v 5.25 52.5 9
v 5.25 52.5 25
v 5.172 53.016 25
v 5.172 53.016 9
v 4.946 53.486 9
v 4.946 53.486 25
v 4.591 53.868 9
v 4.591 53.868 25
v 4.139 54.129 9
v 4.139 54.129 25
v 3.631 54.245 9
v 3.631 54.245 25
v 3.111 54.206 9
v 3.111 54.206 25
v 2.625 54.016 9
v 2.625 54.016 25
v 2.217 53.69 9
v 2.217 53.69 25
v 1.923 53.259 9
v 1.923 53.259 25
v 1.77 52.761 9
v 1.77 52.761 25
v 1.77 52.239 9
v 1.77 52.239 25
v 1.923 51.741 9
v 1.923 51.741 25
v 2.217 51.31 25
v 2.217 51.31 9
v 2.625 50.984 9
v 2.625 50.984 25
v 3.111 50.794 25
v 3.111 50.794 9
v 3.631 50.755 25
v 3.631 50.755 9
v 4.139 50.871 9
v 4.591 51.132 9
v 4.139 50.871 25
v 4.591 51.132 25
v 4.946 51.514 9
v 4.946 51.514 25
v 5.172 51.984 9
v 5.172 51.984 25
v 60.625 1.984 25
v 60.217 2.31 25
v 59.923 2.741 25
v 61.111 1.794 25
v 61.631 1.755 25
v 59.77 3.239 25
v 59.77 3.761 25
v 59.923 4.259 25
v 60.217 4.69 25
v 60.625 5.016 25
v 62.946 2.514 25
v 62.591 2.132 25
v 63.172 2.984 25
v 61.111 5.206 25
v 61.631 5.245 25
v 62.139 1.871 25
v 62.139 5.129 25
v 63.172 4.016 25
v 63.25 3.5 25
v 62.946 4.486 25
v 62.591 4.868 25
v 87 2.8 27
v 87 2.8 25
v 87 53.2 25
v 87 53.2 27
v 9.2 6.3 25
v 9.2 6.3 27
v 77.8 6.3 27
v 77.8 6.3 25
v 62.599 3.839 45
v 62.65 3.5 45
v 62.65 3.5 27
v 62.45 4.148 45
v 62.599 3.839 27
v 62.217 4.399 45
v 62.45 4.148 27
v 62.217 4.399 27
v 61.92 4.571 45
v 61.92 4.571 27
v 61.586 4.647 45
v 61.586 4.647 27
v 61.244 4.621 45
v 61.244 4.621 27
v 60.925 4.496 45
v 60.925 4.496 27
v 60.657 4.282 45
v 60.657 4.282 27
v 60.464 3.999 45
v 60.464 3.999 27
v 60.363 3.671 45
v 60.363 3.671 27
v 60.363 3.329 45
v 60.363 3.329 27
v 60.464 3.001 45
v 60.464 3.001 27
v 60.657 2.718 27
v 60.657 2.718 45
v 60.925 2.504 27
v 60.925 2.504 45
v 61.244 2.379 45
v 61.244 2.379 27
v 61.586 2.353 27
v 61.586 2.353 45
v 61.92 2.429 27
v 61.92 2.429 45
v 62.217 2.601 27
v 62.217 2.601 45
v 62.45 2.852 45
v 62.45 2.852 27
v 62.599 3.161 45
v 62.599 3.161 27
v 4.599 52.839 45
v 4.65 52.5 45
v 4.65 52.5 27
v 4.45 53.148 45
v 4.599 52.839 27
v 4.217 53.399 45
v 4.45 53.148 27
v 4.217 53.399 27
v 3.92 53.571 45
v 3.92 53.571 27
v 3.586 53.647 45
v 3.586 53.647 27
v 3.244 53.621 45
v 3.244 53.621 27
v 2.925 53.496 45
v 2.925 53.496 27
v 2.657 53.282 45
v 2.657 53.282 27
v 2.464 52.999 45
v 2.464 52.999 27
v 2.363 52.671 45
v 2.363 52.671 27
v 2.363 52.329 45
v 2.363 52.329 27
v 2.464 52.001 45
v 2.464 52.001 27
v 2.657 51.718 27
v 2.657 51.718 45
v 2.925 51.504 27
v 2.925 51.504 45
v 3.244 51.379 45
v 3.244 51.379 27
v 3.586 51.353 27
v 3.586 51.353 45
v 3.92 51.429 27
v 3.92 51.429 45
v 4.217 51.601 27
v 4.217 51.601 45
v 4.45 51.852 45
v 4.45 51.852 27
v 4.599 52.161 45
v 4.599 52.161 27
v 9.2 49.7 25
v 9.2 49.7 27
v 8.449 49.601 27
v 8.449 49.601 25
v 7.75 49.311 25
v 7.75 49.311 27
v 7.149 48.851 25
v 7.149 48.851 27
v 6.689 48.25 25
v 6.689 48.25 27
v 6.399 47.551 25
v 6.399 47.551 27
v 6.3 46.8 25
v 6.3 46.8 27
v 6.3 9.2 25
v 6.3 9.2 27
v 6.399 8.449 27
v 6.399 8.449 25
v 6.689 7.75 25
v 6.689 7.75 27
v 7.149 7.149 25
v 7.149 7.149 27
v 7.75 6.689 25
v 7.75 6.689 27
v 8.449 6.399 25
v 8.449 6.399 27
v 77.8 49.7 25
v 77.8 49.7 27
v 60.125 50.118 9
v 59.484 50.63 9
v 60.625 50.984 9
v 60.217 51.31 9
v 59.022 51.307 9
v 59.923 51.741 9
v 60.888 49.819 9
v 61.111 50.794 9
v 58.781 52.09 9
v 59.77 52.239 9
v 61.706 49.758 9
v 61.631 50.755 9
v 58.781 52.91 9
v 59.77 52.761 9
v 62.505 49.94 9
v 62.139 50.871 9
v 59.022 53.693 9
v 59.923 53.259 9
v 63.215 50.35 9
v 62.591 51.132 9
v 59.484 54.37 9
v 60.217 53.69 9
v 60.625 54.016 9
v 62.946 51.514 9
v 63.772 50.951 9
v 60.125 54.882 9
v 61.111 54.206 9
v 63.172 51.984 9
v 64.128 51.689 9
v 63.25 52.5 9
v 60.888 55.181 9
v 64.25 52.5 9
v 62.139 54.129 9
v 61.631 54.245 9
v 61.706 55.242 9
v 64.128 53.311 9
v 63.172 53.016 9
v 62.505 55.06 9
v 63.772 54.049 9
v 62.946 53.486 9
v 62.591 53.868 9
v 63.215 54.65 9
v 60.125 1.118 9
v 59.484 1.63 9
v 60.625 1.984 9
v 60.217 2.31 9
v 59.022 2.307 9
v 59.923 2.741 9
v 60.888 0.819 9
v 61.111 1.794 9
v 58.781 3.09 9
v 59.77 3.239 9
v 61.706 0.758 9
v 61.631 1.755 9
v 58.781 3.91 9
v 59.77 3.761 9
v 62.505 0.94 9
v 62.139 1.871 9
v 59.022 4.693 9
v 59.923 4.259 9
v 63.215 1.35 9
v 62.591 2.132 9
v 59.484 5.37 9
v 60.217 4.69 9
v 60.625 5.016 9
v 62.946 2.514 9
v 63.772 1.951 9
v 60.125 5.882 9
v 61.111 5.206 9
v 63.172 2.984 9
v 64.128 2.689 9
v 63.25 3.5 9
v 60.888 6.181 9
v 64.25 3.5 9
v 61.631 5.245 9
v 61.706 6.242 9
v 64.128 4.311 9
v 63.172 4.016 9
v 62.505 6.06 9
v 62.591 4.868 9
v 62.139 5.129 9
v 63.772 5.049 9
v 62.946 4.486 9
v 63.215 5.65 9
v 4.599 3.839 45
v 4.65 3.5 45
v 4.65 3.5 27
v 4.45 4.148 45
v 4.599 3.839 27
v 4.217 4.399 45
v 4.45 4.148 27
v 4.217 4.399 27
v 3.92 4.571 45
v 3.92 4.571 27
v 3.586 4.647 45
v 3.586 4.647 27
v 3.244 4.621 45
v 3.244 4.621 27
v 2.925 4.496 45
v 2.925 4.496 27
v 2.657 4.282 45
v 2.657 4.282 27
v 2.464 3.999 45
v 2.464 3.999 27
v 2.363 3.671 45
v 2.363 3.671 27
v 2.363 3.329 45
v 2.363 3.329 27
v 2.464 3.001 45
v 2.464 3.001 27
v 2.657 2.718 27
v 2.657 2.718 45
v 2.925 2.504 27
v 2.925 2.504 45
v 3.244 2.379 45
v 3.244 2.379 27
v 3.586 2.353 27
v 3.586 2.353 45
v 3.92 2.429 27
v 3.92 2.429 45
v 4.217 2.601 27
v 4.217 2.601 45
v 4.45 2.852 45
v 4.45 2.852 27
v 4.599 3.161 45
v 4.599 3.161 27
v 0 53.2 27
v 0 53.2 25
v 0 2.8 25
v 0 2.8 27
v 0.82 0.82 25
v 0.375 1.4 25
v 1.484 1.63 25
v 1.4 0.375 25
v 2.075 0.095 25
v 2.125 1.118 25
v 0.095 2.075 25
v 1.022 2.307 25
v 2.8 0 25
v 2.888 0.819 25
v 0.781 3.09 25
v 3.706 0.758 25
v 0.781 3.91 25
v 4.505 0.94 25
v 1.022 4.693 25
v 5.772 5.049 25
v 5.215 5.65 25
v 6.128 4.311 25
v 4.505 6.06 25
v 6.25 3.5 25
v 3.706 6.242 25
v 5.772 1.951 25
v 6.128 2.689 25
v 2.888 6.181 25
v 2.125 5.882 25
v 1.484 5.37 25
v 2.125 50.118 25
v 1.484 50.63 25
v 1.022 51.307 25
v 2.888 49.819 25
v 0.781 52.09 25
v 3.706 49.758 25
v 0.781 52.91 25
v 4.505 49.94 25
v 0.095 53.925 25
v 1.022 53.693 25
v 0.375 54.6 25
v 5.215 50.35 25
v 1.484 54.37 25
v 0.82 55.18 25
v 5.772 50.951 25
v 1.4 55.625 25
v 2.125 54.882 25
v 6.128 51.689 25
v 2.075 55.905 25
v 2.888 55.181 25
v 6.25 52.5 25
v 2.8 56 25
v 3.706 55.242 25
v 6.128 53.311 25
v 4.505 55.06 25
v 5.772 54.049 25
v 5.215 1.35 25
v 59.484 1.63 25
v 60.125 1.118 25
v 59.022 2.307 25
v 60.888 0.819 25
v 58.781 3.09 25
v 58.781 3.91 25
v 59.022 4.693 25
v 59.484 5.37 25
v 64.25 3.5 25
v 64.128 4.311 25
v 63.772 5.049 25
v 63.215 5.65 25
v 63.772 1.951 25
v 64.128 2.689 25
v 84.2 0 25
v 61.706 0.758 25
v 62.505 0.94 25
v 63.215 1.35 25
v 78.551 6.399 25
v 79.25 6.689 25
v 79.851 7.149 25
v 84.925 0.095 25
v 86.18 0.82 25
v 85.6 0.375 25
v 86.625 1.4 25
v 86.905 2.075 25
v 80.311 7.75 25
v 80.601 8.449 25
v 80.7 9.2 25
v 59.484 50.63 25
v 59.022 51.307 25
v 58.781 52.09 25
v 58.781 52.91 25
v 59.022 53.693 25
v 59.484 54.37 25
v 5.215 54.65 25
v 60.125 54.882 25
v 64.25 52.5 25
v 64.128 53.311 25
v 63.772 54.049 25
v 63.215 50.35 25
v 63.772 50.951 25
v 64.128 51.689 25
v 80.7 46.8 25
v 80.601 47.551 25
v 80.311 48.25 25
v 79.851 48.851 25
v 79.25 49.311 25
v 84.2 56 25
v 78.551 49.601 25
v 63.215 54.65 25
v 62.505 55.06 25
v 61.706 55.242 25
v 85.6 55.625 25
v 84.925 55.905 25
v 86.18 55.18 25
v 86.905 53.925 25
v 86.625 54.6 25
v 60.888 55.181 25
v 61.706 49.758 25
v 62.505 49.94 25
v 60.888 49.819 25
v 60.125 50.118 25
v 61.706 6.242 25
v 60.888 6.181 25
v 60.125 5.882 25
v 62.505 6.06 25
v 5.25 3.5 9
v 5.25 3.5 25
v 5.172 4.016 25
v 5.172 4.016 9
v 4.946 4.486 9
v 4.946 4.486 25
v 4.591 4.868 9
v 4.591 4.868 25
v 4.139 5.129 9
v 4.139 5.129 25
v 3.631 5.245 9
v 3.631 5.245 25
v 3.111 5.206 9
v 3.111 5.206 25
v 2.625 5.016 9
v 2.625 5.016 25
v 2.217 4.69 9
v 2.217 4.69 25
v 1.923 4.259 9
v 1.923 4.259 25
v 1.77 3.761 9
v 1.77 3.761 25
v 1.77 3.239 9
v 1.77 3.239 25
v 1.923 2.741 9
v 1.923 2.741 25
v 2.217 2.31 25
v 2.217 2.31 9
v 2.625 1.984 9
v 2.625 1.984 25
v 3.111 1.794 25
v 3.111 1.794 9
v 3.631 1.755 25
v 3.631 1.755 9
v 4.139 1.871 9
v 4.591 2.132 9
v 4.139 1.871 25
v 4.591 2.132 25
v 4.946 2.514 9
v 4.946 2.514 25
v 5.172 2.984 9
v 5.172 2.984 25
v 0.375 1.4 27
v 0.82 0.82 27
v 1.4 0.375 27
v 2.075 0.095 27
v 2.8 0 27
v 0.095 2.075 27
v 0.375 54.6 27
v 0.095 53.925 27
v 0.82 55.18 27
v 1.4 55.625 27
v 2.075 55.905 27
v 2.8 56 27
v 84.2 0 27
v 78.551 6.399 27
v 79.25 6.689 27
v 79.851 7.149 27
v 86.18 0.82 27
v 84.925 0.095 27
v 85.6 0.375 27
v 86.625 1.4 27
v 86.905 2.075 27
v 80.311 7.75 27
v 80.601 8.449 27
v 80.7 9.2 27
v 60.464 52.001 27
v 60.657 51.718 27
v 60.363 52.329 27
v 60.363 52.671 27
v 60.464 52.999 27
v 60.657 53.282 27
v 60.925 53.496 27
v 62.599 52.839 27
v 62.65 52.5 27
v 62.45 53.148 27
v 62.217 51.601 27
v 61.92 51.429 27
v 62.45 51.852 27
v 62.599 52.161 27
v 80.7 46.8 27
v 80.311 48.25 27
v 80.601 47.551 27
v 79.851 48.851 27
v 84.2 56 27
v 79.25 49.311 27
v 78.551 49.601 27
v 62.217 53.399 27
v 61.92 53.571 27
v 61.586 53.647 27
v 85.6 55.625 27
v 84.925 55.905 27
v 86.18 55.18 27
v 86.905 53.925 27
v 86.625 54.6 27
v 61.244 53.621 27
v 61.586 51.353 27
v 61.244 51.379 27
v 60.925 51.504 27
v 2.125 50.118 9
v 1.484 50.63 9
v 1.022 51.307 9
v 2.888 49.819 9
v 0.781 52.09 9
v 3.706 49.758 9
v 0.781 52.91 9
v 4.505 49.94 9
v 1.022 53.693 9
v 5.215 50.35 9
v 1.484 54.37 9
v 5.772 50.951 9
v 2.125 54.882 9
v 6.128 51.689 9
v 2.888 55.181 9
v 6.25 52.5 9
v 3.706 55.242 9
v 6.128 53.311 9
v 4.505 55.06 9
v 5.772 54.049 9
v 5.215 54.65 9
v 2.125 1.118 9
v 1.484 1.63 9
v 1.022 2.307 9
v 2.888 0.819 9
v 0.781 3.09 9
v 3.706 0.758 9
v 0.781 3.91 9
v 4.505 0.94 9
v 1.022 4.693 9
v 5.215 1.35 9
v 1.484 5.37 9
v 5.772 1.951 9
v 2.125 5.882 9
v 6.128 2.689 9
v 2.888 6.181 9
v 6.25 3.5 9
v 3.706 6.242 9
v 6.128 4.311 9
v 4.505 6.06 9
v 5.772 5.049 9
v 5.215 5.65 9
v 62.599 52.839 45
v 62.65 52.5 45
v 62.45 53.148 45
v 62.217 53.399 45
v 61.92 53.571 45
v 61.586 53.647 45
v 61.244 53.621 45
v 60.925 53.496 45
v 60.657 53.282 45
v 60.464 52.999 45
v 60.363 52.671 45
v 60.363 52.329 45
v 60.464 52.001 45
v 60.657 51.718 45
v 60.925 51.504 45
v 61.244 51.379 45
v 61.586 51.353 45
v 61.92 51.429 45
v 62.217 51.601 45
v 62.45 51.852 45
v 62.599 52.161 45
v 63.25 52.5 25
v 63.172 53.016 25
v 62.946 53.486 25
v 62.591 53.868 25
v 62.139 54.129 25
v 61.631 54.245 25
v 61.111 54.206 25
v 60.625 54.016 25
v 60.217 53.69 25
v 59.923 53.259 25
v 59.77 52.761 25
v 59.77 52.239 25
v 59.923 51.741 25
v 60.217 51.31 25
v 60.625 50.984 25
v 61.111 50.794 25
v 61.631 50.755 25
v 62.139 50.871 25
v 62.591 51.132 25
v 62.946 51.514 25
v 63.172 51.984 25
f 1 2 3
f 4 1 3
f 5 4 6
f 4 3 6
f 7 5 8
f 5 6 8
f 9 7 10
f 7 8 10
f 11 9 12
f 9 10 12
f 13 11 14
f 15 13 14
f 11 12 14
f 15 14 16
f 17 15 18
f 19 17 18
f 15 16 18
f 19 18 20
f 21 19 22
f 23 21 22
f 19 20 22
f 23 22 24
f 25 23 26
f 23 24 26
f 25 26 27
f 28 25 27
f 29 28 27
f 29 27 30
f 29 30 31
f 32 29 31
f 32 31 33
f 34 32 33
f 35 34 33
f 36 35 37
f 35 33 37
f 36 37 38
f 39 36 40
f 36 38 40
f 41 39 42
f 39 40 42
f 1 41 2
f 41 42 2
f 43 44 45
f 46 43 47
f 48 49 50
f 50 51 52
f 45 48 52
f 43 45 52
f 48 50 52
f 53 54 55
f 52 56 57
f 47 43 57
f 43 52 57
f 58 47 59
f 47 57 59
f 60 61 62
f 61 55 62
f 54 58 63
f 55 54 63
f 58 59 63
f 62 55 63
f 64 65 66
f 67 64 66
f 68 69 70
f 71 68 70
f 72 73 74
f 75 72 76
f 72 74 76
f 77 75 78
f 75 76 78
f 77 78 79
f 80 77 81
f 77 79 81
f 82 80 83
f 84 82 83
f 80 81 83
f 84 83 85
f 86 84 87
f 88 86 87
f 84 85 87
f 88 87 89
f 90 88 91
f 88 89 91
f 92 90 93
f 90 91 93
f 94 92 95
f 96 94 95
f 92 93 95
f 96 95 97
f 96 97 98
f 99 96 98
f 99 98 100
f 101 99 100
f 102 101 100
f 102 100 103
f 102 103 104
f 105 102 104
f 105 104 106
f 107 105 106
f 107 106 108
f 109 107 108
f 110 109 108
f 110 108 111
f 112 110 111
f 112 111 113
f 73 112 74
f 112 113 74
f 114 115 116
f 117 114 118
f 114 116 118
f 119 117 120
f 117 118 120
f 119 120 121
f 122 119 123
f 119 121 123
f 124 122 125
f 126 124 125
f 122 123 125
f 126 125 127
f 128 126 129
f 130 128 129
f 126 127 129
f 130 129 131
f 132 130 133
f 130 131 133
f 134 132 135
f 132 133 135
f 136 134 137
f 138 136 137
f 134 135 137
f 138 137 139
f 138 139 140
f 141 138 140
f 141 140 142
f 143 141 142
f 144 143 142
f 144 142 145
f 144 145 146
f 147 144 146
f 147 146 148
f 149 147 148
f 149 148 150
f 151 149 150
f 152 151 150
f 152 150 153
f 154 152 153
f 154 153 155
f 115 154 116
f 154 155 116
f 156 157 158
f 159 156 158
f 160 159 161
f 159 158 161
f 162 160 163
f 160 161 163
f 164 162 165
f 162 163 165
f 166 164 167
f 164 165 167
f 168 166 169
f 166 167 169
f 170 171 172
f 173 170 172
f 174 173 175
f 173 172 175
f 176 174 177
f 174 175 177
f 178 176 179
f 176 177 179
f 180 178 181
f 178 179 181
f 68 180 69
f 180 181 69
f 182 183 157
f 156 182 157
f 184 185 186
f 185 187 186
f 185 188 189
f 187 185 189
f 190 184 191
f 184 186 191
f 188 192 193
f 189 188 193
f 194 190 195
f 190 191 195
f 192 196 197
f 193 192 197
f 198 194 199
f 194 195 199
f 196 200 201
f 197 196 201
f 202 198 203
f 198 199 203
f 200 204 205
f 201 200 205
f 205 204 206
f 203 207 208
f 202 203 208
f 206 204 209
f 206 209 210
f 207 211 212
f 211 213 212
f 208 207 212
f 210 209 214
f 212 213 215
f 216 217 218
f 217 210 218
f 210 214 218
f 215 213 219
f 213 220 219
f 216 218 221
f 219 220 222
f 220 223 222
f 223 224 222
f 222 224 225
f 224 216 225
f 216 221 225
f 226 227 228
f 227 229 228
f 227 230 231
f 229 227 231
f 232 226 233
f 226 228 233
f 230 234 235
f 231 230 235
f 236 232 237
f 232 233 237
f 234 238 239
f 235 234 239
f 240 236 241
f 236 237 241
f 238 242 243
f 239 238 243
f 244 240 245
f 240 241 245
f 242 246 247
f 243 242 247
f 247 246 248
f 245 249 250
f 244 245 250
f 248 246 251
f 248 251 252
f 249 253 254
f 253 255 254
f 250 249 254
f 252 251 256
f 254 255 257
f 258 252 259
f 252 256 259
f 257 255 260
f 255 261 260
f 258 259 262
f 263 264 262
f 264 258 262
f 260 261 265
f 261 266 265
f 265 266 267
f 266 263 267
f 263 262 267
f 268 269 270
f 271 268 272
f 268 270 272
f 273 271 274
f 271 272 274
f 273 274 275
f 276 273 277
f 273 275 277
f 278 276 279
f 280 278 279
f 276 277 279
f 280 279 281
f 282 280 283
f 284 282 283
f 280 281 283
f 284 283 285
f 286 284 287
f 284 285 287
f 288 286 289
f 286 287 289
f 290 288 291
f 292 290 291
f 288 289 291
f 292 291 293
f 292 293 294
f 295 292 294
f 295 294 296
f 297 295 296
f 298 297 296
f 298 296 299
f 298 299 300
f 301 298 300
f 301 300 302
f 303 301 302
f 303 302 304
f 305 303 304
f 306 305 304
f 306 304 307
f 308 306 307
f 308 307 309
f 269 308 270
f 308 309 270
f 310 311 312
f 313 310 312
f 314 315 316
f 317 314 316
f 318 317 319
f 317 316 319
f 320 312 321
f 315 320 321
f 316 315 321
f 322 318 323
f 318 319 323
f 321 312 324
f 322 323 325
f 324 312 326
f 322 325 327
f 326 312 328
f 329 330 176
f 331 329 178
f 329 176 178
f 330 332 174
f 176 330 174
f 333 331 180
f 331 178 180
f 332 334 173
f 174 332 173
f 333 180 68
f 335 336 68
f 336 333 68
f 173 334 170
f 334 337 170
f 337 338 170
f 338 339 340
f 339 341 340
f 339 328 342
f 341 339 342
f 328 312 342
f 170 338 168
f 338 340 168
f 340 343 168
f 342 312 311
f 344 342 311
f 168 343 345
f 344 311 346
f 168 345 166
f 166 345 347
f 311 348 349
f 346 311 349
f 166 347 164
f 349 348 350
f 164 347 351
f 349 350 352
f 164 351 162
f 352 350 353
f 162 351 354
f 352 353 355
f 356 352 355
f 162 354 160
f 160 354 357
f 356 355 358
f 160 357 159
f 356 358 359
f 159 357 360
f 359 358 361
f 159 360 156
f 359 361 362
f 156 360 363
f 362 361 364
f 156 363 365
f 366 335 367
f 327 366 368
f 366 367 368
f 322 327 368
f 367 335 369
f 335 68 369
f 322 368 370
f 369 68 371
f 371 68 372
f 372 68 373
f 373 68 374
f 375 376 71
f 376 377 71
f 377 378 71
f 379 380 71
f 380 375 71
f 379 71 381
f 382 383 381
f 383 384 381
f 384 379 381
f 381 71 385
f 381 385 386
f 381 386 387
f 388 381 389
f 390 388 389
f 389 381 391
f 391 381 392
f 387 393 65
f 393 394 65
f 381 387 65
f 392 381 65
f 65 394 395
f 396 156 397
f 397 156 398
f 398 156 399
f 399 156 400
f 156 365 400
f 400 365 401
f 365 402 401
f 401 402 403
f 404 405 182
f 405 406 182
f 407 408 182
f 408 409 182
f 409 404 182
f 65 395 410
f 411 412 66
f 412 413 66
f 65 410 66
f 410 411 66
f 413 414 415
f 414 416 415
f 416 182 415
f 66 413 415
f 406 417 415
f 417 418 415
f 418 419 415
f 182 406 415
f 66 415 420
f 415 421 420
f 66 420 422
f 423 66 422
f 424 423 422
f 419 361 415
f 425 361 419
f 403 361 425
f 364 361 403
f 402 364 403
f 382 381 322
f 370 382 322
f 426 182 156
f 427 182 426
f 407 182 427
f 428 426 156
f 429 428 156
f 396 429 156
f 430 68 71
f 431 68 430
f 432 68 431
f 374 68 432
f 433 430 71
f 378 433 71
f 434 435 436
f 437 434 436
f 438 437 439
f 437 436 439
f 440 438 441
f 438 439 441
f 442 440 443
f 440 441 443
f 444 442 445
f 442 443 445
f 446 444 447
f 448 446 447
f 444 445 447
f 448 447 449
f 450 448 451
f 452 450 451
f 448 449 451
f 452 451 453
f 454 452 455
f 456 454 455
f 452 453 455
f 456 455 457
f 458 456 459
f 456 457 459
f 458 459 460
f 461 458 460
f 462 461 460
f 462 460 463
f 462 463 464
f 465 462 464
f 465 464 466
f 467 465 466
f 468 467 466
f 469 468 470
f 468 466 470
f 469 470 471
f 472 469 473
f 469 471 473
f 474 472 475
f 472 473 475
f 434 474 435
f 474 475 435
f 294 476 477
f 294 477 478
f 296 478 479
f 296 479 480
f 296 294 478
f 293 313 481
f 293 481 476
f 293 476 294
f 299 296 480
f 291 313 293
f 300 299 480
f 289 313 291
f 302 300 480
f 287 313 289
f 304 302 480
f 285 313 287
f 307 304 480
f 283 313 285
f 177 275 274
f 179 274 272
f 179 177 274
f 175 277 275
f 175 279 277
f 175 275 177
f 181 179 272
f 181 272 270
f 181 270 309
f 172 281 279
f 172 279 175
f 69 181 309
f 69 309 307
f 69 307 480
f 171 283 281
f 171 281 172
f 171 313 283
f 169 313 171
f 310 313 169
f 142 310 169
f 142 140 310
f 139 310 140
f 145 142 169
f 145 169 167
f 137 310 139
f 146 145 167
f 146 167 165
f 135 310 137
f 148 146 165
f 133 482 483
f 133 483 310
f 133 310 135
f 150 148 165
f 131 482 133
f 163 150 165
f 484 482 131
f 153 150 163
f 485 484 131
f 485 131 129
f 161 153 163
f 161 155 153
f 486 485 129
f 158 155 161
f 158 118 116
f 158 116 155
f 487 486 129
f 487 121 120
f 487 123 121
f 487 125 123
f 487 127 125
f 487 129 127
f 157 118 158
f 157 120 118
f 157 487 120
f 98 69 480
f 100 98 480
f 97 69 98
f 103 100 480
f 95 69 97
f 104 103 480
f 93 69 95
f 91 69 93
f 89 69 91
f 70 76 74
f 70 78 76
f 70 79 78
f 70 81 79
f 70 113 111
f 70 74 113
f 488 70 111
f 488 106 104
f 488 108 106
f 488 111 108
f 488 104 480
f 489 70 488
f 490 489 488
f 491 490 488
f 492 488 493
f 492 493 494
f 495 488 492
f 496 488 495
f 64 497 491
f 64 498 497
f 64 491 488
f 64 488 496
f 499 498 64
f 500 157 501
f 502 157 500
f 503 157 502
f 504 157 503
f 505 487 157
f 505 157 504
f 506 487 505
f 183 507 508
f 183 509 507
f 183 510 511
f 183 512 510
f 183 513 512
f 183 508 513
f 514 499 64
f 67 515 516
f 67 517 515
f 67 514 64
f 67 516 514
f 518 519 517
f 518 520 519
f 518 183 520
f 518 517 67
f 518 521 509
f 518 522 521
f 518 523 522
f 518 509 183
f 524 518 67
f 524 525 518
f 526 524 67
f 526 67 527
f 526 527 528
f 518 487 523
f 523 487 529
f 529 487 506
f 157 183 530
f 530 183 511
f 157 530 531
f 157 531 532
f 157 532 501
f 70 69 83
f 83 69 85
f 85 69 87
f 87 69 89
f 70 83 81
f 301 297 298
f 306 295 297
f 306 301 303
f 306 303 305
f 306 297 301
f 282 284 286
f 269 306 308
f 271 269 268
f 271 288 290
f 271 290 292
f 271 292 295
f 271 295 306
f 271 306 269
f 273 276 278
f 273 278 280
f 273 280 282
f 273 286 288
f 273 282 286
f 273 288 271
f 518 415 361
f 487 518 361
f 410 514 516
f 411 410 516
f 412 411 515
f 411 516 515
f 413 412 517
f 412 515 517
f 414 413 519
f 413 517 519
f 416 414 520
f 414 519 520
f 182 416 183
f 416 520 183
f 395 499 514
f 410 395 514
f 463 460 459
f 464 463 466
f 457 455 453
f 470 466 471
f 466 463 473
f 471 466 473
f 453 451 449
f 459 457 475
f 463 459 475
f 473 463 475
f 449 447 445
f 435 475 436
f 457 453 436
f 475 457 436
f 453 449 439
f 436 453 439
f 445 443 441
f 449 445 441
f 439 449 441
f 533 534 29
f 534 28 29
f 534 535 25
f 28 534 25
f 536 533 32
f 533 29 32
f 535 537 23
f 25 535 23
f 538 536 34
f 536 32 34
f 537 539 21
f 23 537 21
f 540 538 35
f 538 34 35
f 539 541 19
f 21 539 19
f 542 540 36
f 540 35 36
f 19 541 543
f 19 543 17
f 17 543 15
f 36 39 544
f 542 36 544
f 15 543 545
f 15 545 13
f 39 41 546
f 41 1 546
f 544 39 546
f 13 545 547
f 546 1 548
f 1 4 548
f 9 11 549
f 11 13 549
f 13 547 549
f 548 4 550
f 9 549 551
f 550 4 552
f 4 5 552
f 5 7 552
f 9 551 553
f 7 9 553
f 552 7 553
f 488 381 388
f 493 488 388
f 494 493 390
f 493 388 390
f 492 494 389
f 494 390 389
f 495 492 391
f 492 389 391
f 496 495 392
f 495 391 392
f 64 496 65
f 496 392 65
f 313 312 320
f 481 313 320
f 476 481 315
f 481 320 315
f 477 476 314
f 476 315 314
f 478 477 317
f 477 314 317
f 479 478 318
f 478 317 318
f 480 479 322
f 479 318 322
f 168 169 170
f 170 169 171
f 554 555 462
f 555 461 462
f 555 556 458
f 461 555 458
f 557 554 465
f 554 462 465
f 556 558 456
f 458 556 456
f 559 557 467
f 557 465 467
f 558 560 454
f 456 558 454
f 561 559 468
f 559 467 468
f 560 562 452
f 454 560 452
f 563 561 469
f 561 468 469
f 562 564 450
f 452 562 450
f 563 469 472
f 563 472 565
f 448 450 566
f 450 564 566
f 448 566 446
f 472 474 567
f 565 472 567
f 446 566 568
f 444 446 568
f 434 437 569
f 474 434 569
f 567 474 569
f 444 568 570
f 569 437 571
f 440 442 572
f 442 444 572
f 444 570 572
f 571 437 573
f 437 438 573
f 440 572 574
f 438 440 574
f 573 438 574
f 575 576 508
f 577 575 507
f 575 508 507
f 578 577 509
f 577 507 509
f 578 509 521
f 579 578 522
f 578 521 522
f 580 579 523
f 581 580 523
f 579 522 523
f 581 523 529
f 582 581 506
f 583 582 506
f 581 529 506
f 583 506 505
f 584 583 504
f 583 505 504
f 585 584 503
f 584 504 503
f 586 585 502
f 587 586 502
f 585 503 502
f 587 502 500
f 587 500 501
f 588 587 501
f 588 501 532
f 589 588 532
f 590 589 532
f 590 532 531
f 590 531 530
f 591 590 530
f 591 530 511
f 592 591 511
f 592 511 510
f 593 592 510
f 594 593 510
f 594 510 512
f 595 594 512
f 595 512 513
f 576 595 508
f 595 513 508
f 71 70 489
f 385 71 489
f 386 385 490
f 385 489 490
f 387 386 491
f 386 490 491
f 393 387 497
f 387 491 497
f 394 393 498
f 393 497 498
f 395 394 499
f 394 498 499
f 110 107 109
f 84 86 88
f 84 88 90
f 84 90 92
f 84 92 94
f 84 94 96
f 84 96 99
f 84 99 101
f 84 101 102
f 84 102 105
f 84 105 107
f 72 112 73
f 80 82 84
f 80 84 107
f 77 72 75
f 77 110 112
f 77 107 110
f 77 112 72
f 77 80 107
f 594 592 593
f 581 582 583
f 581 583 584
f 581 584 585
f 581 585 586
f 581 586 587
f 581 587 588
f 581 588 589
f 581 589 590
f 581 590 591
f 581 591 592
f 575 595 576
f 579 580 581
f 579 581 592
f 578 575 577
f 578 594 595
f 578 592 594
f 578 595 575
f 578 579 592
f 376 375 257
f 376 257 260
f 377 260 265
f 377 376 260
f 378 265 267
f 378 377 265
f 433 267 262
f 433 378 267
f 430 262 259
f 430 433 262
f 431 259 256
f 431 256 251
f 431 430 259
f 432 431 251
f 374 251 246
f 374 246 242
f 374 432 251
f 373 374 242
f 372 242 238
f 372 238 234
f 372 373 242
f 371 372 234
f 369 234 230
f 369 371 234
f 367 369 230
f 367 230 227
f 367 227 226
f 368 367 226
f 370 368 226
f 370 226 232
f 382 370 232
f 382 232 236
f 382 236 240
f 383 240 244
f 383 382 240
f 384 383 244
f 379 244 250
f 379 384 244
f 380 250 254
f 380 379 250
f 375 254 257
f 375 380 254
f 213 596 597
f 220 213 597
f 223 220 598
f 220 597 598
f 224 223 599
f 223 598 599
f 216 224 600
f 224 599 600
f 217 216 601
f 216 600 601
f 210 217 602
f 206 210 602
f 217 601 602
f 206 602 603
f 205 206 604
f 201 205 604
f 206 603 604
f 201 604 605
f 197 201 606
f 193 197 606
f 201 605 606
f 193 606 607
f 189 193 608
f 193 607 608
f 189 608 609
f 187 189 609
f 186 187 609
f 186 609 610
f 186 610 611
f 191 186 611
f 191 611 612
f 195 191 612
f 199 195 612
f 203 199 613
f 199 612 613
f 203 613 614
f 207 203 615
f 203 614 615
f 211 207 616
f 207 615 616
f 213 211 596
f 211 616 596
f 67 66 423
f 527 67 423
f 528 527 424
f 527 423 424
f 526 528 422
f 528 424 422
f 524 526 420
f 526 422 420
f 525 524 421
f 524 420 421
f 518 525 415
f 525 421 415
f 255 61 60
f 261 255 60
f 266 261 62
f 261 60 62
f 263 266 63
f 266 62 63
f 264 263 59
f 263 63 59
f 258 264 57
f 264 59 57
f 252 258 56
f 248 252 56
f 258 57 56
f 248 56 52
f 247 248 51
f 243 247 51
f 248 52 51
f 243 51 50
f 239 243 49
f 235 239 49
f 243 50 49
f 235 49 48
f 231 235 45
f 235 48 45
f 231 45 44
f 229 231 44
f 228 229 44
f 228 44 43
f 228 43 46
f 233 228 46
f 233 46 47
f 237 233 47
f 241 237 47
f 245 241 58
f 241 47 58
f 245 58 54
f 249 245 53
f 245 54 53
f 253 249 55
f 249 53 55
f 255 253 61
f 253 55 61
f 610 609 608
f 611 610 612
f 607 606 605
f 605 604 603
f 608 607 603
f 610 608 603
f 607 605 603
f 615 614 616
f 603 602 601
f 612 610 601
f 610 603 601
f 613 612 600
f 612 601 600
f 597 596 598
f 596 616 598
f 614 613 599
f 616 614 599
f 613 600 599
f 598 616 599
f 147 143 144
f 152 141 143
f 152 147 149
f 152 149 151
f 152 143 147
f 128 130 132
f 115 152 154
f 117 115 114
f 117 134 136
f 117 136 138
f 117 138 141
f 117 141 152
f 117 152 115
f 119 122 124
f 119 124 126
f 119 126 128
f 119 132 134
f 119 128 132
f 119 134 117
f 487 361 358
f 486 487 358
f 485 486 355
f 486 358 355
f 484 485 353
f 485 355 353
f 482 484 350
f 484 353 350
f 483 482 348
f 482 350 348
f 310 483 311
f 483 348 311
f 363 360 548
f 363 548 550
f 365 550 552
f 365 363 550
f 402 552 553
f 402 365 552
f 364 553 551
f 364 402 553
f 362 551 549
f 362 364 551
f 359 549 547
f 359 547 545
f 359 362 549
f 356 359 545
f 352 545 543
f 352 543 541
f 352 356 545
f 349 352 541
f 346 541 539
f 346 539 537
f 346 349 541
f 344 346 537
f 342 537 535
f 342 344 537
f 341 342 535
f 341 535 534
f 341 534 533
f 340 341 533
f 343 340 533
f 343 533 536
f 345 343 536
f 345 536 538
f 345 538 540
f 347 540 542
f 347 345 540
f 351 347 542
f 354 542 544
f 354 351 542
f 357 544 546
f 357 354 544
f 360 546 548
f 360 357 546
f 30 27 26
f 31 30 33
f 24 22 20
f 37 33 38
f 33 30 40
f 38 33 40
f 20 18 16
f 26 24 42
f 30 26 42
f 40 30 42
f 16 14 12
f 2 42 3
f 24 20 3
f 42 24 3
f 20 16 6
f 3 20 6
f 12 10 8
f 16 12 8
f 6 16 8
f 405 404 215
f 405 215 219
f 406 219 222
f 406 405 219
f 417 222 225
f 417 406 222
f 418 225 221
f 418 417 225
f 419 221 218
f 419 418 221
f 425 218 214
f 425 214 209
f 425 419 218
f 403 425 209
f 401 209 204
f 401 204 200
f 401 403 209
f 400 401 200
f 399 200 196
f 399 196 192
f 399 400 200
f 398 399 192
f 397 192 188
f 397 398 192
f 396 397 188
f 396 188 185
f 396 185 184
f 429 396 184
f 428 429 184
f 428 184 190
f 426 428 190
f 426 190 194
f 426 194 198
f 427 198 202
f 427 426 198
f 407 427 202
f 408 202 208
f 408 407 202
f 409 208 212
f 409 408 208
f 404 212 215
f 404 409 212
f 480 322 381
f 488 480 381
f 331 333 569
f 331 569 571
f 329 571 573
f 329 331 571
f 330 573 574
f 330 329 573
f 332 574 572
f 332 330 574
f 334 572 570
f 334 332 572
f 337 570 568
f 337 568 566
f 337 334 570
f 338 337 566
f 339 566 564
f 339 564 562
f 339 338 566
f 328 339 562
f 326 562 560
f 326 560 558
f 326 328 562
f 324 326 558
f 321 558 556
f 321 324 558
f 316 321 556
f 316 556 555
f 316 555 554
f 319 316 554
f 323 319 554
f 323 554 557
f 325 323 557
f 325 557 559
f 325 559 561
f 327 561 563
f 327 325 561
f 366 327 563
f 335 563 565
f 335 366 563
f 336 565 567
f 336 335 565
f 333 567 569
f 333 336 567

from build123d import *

# Parameters (mm, degrees)
F0_R      = 1.15
F1_DEPTH  = 2
F2_DEPTH  = 105
F4_R      = 2.75
F4_R_2    = 1.75
F5_DEPTH  = 2
F6_DEPTH  = 2
F7_DEPTH  = 16
F9_R      = 1.15
F10_DEPTH = 18
F12_DEPTH = 2


with BuildPart() as f1:
    # F0 (on Top) → F1 (new body)
    with BuildSketch(Plane.XY):
        with BuildLine():
            ThreePointArc((0, 2.8), (0.8201010127, 0.8201010127), (2.8, 0))
            Line((2.8, 0), (84.2, 0))
            ThreePointArc((84.2, 0), (86.1798989873, 0.8201010127), (87, 2.8))
            Line((87, 2.8), (87, 53.2))
            ThreePointArc((87, 53.2), (86.1798989873, 55.1798989873), (84.2, 56))
            Line((84.2, 56), (2.8, 56))
            ThreePointArc((2.8, 56), (0.8201010127, 55.1798989873), (0, 53.2))
            Line((0, 53.2), (0, 2.8))
        make_face()
        with Locations((3.5, 3.5)):
            Circle(F0_R, mode=Mode.SUBTRACT)
        with Locations((61.5, 3.5)):
            Circle(F0_R, mode=Mode.SUBTRACT)
        with Locations((3.5, 52.5)):
            Circle(F0_R, mode=Mode.SUBTRACT)
        with Locations((61.5, 52.5)):
            Circle(F0_R, mode=Mode.SUBTRACT)
        with Locations((3.5, 3.5)):
            Circle(F0_R)
        with Locations((61.5, 52.5)):
            Circle(F0_R)
        with Locations((61.5, 3.5)):
            Circle(F0_R)
        with Locations((3.5, 52.5)):
            Circle(F0_R)
    extrude(amount=F1_DEPTH)

    # F0 (on Top) → F2 (join)
    with BuildSketch(Plane.XY):
        with Locations((61.5, 3.5)):
            Circle(F0_R)
        with Locations((61.5, 52.5)):
            Circle(F0_R)
        with Locations((3.5, 52.5)):
            Circle(F0_R)
        with Locations((3.5, 3.5)):
            Circle(F0_R)
    extrude(amount=F2_DEPTH)


with BuildPart() as f5:
    # F4 (on offset) → F5 (new body)
    with BuildSketch(Plane.XY.offset(25)):
        with BuildLine():
            Line((84.2, 56), (2.8, 56))
            ThreePointArc((2.8, 56), (0.8201010127, 55.1798989873), (0, 53.2))
            Line((0, 53.2), (0, 2.8))
            ThreePointArc((0, 2.8), (0.8201010127, 0.8201010127), (2.8, 0))
            Line((2.8, 0), (84.2, 0))
            ThreePointArc((84.2, 0), (86.1798989873, 0.8201010127), (87, 2.8))
            Line((87, 2.8), (87, 53.2))
            ThreePointArc((87, 53.2), (86.1798989873, 55.1798989873), (84.2, 56))
        make_face()
        with Locations((3.5, 3.5)):
            Circle(F4_R, mode=Mode.SUBTRACT)
        with Locations((61.5, 3.5)):
            Circle(F4_R, mode=Mode.SUBTRACT)
        with Locations((3.5, 52.5)):
            Circle(F4_R, mode=Mode.SUBTRACT)
        with Locations((61.5, 52.5)):
            Circle(F4_R, mode=Mode.SUBTRACT)
        with Locations((3.5, 3.5)):
            Circle(F4_R)
        with Locations((3.5, 3.5)):
            Circle(F4_R_2, mode=Mode.SUBTRACT)
        with Locations((61.5, 3.5)):
            Circle(F4_R)
        with Locations((61.5, 3.5)):
            Circle(F4_R_2, mode=Mode.SUBTRACT)
        with Locations((61.5, 52.5)):
            Circle(F4_R)
        with Locations((61.5, 52.5)):
            Circle(F4_R_2, mode=Mode.SUBTRACT)
        with Locations((3.5, 52.5)):
            Circle(F4_R)
        with Locations((3.5, 52.5)):
            Circle(F4_R_2, mode=Mode.SUBTRACT)
        with Locations((3.5, 3.5)):
            Circle(F4_R_2)
        with Locations((61.5, 3.5)):
            Circle(F4_R_2)
        with Locations((61.5, 52.5)):
            Circle(F4_R_2)
        with Locations((3.5, 52.5)):
            Circle(F4_R_2)
    extrude(amount=F5_DEPTH)

    # F4 (on offset) → F6 (join, through all)
    with BuildSketch(Plane.XY.offset(25)):
        with Locations((3.5, 3.5)):
            Circle(F4_R)
        with Locations((3.5, 3.5)):
            Circle(F4_R_2, mode=Mode.SUBTRACT)
        with Locations((3.5, 52.5)):
            Circle(F4_R)
        with Locations((3.5, 52.5)):
            Circle(F4_R_2, mode=Mode.SUBTRACT)
        with Locations((61.5, 52.5)):
            Circle(F4_R)
        with Locations((61.5, 52.5)):
            Circle(F4_R_2, mode=Mode.SUBTRACT)
        with Locations((61.5, 3.5)):
            Circle(F4_R)
        with Locations((61.5, 3.5)):
            Circle(F4_R_2, mode=Mode.SUBTRACT)
    extrude(amount=F6_DEPTH)

    # F4 (on offset) → F7 (join)
    with BuildSketch(Plane.XY.offset(25)):
        with Locations((3.5, 3.5)):
            Circle(F4_R)
        with Locations((3.5, 3.5)):
            Circle(F4_R_2, mode=Mode.SUBTRACT)
        with Locations((3.5, 52.5)):
            Circle(F4_R)
        with Locations((3.5, 52.5)):
            Circle(F4_R_2, mode=Mode.SUBTRACT)
        with Locations((61.5, 3.5)):
            Circle(F4_R)
        with Locations((61.5, 3.5)):
            Circle(F4_R_2, mode=Mode.SUBTRACT)
        with Locations((61.5, 52.5)):
            Circle(F4_R)
        with Locations((61.5, 52.5)):
            Circle(F4_R_2, mode=Mode.SUBTRACT)
    extrude(amount=-F7_DEPTH)

    # F9 (on face) → F10 (join)
    with BuildSketch(Plane.XY.offset(27)):
        with Locations((3.5, 52.5)):
            Circle(F9_R)
        with Locations((61.5, 52.5)):
            Circle(F9_R)
        with Locations((61.5, 3.5)):
            Circle(F9_R)
        with Locations((3.5, 3.5)):
            Circle(F9_R)
    extrude(amount=F10_DEPTH)

    # F11 (on face) → F12 (cut)
    with BuildSketch(Plane.XY.offset(27)):
        with BuildLine():
            Line((6.3, 46.8), (6.3, 9.2))
            ThreePointArc((6.3, 9.2), (7.1493903346, 7.1493903346), (9.2, 6.3))
            Line((9.2, 6.3), (77.8, 6.3))
            ThreePointArc((77.8, 6.3), (79.8506096654, 7.1493903346), (80.7, 9.2))
            Line((80.7, 9.2), (80.7, 46.8))
            ThreePointArc((80.7, 46.8), (79.8506096654, 48.8506096654), (77.8, 49.7))
            Line((77.8, 49.7), (9.2, 49.7))
            ThreePointArc((9.2, 49.7), (7.1493903346, 48.8506096654), (6.3, 46.8))
        make_face()
    extrude(amount=-F12_DEPTH, mode=Mode.SUBTRACT)


solid = f5.part
